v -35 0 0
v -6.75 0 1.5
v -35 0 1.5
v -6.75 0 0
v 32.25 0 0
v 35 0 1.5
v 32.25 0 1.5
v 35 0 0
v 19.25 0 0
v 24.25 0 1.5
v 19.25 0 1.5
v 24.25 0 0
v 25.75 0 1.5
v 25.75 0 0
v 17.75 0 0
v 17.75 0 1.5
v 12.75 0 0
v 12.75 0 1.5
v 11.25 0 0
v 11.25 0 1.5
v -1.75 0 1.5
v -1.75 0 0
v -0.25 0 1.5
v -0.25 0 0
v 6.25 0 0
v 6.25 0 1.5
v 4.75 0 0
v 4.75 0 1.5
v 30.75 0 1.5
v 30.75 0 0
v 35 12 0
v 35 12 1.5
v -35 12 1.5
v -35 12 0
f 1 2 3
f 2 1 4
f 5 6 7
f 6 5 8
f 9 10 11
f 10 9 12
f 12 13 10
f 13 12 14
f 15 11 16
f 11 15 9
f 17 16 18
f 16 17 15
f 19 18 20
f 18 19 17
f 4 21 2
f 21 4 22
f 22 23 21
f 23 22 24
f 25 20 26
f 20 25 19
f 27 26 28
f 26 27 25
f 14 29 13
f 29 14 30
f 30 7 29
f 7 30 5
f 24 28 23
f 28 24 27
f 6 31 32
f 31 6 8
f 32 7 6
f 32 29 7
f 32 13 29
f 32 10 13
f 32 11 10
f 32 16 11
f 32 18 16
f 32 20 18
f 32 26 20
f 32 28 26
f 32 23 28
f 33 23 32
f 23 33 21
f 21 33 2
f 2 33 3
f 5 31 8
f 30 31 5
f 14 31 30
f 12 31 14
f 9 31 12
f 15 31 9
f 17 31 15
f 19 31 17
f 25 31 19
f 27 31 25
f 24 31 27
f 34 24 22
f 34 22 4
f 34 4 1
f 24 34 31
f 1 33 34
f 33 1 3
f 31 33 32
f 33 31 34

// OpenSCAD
// 10-well comb for agarose gel casting
// Printed lying flat, teeth pointing down (-Y)

$fn = 64;

// ---- Dimensions (mm) ----
spine_len    = 70;    // spine length (X)
spine_wid    = 12;    // spine width (Y)
tooth_w      = 5.0;   // tooth width (X)
tooth_len    = 12;    // tooth length (Y)
tooth_count  = 10;    // number of teeth
gap          = 1.5;   // tooth gap (X)
plate_t      = 1.5;   // plate thickness (Z)
eps          = 0.5;   // cutter overshoot

// ---- Derived ----
pitch   = tooth_w + gap;
x_start = -(tooth_count - 1) * gap / 2;

// ---- Model ----
difference() {
    // Spine
    translate([-spine_len/2, 0, 0])
        cube([spine_len, spine_wid, plate_t]);

    // Teeth
    for (i = [0 : tooth_count - 1])
        translate([x_start + i * pitch, -tooth_len, 0])
            cube([tooth_w, tooth_len, plate_t + eps]);
}
